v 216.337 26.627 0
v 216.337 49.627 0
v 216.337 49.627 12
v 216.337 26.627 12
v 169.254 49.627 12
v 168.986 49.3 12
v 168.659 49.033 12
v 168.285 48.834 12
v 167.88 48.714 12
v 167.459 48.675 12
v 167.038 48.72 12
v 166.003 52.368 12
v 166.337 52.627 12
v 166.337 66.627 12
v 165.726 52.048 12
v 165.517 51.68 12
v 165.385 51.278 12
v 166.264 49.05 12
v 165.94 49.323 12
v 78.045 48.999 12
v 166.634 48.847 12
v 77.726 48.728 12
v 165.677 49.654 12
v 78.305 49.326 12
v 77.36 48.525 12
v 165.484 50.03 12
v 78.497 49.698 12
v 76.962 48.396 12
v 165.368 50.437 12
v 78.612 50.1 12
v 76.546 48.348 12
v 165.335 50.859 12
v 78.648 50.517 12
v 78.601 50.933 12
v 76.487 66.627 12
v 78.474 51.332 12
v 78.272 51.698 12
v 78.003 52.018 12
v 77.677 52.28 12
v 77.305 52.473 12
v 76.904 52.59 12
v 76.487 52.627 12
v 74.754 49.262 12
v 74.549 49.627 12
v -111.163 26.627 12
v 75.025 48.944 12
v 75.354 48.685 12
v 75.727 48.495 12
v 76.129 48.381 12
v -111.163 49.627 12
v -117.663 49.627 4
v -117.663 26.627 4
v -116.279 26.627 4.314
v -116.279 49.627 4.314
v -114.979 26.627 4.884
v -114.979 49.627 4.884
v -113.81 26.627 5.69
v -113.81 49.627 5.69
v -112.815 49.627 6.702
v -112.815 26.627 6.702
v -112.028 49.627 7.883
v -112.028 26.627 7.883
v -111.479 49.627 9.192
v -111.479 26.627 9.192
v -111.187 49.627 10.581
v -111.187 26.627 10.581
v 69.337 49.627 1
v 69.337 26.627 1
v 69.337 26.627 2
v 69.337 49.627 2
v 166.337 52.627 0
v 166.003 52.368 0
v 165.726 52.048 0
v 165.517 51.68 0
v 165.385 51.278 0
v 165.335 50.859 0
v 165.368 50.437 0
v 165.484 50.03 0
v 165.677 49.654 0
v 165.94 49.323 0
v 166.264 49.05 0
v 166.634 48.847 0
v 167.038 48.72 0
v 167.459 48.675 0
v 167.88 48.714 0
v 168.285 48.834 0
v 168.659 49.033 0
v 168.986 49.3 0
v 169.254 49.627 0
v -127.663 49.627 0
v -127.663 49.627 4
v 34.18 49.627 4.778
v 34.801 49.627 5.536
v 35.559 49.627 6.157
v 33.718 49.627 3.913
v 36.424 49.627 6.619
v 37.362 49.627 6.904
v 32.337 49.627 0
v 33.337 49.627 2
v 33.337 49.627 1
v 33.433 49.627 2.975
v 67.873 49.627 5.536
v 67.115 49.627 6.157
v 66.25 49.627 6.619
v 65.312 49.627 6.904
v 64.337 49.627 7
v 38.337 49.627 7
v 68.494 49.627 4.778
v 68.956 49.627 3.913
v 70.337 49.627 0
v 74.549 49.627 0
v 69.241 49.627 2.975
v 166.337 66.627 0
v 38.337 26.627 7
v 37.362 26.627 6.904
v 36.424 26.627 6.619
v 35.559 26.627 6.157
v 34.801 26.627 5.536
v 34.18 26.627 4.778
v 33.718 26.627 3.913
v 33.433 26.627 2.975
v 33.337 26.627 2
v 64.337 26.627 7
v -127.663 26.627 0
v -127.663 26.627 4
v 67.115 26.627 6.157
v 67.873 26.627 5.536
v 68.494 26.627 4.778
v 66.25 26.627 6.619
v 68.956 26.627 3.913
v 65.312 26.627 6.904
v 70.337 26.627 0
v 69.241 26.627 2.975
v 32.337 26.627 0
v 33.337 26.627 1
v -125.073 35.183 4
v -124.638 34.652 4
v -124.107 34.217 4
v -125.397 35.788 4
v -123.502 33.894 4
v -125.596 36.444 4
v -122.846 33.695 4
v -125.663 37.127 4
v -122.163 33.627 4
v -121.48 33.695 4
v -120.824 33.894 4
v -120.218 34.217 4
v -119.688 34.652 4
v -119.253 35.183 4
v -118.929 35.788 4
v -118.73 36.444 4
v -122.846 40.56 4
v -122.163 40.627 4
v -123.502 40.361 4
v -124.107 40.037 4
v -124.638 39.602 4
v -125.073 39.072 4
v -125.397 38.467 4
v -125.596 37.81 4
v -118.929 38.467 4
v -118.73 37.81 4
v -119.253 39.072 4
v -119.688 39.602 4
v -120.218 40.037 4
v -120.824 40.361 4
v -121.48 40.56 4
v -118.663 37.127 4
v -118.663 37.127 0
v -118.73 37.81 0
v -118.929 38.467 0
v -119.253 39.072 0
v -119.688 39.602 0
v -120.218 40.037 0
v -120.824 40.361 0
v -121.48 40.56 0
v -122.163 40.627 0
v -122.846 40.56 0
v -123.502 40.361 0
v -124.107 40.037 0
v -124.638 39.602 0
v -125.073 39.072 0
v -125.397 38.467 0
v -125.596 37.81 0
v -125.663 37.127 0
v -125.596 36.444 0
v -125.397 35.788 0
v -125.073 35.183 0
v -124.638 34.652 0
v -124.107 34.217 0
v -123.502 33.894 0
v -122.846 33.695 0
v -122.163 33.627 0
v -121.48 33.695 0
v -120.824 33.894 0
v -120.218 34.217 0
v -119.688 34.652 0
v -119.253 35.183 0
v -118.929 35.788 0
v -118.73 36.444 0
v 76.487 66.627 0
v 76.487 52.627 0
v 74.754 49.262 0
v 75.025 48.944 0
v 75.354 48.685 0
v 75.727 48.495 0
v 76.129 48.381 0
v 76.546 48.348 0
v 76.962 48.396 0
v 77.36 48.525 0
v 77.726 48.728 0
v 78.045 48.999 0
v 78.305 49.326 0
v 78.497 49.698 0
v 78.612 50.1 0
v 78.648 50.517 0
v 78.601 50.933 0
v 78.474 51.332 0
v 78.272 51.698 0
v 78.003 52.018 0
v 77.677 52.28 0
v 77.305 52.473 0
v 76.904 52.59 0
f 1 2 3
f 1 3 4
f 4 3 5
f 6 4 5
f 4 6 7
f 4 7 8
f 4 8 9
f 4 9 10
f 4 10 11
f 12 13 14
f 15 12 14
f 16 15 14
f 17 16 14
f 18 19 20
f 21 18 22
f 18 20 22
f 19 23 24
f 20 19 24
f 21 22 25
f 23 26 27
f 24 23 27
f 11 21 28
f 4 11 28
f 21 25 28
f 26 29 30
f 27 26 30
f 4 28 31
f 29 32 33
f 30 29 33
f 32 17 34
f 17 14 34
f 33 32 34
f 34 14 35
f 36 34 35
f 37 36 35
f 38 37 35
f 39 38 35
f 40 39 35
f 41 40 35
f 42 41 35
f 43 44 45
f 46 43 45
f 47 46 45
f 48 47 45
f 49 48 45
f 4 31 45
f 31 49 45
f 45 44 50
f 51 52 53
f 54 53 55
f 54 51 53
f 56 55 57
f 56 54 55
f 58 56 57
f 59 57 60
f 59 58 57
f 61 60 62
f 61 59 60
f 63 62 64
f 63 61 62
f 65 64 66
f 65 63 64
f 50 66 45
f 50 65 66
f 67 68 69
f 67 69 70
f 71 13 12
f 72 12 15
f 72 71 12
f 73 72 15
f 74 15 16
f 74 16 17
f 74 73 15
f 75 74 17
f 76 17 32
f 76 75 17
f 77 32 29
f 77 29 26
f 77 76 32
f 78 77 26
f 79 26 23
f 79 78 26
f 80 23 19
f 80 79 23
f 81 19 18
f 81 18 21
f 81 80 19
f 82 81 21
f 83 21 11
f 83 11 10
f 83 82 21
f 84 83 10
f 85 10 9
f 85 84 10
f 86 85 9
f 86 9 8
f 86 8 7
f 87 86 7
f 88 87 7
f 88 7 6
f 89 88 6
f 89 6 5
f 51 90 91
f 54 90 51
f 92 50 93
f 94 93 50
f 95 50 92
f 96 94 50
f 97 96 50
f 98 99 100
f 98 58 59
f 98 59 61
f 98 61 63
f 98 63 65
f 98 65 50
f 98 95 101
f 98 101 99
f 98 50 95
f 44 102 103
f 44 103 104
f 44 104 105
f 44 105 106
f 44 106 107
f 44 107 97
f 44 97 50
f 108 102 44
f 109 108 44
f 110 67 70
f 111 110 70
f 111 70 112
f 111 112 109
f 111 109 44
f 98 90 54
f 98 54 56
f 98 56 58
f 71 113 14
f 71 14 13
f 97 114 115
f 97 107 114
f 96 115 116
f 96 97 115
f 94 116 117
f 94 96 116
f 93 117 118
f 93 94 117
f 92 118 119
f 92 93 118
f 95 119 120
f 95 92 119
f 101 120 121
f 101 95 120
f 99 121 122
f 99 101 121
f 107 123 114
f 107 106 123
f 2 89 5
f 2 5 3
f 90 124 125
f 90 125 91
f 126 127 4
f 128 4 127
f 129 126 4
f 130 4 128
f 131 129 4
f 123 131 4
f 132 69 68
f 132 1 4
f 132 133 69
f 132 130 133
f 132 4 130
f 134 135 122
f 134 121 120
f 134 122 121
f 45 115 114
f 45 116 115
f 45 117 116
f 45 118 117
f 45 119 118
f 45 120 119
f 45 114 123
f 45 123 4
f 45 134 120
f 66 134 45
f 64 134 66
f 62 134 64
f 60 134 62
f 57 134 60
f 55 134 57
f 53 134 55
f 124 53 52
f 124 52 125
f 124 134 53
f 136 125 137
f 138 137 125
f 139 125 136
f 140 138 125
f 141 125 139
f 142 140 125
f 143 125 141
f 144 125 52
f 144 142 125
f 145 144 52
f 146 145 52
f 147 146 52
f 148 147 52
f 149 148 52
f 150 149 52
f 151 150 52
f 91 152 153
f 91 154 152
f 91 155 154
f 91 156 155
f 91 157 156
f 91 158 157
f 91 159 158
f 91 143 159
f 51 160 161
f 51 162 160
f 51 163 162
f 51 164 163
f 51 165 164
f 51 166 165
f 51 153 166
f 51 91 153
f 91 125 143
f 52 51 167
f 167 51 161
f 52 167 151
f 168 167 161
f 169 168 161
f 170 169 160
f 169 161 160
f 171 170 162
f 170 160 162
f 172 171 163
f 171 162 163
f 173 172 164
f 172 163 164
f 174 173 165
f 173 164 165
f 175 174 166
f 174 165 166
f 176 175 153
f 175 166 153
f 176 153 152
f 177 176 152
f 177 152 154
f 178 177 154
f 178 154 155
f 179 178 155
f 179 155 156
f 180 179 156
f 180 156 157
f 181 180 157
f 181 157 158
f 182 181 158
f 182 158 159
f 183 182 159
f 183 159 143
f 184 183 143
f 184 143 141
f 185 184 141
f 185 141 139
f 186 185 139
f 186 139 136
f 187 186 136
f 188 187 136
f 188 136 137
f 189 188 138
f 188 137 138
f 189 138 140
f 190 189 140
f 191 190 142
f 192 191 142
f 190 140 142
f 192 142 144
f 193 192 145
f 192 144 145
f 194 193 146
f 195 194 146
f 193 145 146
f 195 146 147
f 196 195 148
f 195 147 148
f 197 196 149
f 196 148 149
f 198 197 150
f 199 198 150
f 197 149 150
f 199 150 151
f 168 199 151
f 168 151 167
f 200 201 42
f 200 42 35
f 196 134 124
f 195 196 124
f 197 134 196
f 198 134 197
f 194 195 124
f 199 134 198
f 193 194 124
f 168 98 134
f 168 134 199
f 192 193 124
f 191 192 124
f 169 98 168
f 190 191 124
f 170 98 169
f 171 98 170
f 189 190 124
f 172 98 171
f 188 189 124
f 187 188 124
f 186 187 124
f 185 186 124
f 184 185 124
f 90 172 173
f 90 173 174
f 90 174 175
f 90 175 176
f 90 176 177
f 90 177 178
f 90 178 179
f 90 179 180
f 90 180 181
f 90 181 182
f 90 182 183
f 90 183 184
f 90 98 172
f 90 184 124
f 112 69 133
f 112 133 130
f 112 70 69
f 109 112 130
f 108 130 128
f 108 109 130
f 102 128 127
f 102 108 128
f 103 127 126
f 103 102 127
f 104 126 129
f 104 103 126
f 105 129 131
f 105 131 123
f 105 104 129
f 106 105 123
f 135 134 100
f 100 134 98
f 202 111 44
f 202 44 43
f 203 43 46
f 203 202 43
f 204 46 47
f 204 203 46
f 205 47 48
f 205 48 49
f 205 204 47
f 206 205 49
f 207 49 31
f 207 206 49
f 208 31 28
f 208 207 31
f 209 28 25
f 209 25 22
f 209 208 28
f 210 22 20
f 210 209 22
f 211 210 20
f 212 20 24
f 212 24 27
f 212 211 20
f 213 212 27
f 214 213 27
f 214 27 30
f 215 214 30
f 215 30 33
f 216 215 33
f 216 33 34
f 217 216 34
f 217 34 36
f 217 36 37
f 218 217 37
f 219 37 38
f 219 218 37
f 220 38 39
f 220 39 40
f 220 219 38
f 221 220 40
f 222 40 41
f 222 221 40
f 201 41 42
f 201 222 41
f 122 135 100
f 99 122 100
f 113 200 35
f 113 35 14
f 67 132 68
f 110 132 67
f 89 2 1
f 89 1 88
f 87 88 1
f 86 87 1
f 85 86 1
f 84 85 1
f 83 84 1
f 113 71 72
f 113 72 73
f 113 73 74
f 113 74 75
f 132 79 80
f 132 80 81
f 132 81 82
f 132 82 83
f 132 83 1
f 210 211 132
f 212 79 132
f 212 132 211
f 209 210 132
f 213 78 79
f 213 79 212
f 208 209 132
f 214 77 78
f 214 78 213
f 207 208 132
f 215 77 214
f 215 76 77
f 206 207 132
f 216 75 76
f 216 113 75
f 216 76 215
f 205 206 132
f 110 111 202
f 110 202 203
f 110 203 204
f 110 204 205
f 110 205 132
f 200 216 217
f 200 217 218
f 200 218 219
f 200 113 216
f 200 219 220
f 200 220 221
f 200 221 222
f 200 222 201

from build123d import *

# Parameters (mm, degrees)
SALIENTE_EXTRUIR1_DEPTH = 12
CROQUIS3_W              = 36
CROQUIS3_H              = 23
CORTAR_EXTRUIR2_DEPTH   = 7
REDONDEO1_R             = 5
CHAFL_N1_SIZE           = 1
CORTAR_EXTRUIR3_DEPTH   = 24
CROQUIS5_R              = 3.5
CORTAR_EXTRUIR4_DEPTH   = 20


with BuildPart() as part:
    # Croquis1 → Saliente-Extruir1 (new body)
    with BuildSketch(Plane.XY):
        with BuildLine():
            Line((216.337020033, 49.627252252), (216.337020033, 26.627252252))
            Line((216.337020033, 26.627252252), (-127.662979967, 26.627252252))
            Line((-127.662979967, 26.627252252), (-127.662979967, 49.627252252))
            Line((-127.662979967, 49.627252252), (74.548659913, 49.627252252))
            ThreePointArc((74.548659913, 49.627252252), (78.30523428, 49.32626093), (76.487020033, 52.627252252))
            Line((76.487020033, 52.627252252), (76.487020033, 66.627252252))
            Line((76.487020033, 66.627252252), (166.337020033, 66.627252252))
            Line((166.337020033, 66.627252252), (166.337020033, 52.627252252))
            ThreePointArc((166.337020033, 52.627252252), (165.940329064, 49.322890173), (169.254470914, 49.627252252))
            Line((169.254470914, 49.627252252), (216.337020033, 49.627252252))
        make_face()
    extrude(amount=SALIENTE_EXTRUIR1_DEPTH)

    # Croquis3 → Cortar-Extruir2 (cut)
    with BuildSketch(Plane(origin=(0, 0, 0), x_dir=(-1, 0, 0), z_dir=(0, 0, -1))):
        with Locations((-51.337020033, 38.127252252)):
            Rectangle(CROQUIS3_W, CROQUIS3_H)
    extrude(amount=-CORTAR_EXTRUIR2_DEPTH, mode=Mode.SUBTRACT)

    # Redondeo1
    redondeo1_edges = [part.edges().sort_by_distance(p)[0] for p in [
        (69.337020033, 38.127252252, 7),
        (33.337020033, 38.127252252, 7),
    ]]
    fillet(redondeo1_edges, radius=REDONDEO1_R)

    # Chaflán1
    chafl_n1_edges = [part.edges().sort_by_distance(p)[0] for p in [
        (33.337020033, 38.127252252, 0),
        (69.337020033, 38.127252252, 0),
    ]]
    chamfer(chafl_n1_edges, length=CHAFL_N1_SIZE)

    # Croquis4 → Cortar-Extruir3 (cut, through all)
    with BuildSketch(Plane(origin=(0, 49.627252252, 0), x_dir=(1, 0, 0), z_dir=(0, 1, 0))):
        with BuildLine():
            Line((-127.662979967, -12), (-127.662979967, -4))
            Line((-127.662979967, -4), (-117.662979967, -4))
            ThreePointArc((-117.662979967, -4), (-112.814866526, -6.70153283), (-111.162979967, -12))
            Line((-111.162979967, -12), (-127.662979967, -12))
        make_face()
    extrude(amount=-CORTAR_EXTRUIR3_DEPTH, mode=Mode.SUBTRACT)

    # Croquis5 → Cortar-Extruir4 (cut)
    with BuildSketch(Plane.XY.offset(14)):
        with Locations((-122.162979967, 37.127252252)):
            Circle(CROQUIS5_R)
    extrude(amount=-CORTAR_EXTRUIR4_DEPTH, mode=Mode.SUBTRACT)


solid = part.part
